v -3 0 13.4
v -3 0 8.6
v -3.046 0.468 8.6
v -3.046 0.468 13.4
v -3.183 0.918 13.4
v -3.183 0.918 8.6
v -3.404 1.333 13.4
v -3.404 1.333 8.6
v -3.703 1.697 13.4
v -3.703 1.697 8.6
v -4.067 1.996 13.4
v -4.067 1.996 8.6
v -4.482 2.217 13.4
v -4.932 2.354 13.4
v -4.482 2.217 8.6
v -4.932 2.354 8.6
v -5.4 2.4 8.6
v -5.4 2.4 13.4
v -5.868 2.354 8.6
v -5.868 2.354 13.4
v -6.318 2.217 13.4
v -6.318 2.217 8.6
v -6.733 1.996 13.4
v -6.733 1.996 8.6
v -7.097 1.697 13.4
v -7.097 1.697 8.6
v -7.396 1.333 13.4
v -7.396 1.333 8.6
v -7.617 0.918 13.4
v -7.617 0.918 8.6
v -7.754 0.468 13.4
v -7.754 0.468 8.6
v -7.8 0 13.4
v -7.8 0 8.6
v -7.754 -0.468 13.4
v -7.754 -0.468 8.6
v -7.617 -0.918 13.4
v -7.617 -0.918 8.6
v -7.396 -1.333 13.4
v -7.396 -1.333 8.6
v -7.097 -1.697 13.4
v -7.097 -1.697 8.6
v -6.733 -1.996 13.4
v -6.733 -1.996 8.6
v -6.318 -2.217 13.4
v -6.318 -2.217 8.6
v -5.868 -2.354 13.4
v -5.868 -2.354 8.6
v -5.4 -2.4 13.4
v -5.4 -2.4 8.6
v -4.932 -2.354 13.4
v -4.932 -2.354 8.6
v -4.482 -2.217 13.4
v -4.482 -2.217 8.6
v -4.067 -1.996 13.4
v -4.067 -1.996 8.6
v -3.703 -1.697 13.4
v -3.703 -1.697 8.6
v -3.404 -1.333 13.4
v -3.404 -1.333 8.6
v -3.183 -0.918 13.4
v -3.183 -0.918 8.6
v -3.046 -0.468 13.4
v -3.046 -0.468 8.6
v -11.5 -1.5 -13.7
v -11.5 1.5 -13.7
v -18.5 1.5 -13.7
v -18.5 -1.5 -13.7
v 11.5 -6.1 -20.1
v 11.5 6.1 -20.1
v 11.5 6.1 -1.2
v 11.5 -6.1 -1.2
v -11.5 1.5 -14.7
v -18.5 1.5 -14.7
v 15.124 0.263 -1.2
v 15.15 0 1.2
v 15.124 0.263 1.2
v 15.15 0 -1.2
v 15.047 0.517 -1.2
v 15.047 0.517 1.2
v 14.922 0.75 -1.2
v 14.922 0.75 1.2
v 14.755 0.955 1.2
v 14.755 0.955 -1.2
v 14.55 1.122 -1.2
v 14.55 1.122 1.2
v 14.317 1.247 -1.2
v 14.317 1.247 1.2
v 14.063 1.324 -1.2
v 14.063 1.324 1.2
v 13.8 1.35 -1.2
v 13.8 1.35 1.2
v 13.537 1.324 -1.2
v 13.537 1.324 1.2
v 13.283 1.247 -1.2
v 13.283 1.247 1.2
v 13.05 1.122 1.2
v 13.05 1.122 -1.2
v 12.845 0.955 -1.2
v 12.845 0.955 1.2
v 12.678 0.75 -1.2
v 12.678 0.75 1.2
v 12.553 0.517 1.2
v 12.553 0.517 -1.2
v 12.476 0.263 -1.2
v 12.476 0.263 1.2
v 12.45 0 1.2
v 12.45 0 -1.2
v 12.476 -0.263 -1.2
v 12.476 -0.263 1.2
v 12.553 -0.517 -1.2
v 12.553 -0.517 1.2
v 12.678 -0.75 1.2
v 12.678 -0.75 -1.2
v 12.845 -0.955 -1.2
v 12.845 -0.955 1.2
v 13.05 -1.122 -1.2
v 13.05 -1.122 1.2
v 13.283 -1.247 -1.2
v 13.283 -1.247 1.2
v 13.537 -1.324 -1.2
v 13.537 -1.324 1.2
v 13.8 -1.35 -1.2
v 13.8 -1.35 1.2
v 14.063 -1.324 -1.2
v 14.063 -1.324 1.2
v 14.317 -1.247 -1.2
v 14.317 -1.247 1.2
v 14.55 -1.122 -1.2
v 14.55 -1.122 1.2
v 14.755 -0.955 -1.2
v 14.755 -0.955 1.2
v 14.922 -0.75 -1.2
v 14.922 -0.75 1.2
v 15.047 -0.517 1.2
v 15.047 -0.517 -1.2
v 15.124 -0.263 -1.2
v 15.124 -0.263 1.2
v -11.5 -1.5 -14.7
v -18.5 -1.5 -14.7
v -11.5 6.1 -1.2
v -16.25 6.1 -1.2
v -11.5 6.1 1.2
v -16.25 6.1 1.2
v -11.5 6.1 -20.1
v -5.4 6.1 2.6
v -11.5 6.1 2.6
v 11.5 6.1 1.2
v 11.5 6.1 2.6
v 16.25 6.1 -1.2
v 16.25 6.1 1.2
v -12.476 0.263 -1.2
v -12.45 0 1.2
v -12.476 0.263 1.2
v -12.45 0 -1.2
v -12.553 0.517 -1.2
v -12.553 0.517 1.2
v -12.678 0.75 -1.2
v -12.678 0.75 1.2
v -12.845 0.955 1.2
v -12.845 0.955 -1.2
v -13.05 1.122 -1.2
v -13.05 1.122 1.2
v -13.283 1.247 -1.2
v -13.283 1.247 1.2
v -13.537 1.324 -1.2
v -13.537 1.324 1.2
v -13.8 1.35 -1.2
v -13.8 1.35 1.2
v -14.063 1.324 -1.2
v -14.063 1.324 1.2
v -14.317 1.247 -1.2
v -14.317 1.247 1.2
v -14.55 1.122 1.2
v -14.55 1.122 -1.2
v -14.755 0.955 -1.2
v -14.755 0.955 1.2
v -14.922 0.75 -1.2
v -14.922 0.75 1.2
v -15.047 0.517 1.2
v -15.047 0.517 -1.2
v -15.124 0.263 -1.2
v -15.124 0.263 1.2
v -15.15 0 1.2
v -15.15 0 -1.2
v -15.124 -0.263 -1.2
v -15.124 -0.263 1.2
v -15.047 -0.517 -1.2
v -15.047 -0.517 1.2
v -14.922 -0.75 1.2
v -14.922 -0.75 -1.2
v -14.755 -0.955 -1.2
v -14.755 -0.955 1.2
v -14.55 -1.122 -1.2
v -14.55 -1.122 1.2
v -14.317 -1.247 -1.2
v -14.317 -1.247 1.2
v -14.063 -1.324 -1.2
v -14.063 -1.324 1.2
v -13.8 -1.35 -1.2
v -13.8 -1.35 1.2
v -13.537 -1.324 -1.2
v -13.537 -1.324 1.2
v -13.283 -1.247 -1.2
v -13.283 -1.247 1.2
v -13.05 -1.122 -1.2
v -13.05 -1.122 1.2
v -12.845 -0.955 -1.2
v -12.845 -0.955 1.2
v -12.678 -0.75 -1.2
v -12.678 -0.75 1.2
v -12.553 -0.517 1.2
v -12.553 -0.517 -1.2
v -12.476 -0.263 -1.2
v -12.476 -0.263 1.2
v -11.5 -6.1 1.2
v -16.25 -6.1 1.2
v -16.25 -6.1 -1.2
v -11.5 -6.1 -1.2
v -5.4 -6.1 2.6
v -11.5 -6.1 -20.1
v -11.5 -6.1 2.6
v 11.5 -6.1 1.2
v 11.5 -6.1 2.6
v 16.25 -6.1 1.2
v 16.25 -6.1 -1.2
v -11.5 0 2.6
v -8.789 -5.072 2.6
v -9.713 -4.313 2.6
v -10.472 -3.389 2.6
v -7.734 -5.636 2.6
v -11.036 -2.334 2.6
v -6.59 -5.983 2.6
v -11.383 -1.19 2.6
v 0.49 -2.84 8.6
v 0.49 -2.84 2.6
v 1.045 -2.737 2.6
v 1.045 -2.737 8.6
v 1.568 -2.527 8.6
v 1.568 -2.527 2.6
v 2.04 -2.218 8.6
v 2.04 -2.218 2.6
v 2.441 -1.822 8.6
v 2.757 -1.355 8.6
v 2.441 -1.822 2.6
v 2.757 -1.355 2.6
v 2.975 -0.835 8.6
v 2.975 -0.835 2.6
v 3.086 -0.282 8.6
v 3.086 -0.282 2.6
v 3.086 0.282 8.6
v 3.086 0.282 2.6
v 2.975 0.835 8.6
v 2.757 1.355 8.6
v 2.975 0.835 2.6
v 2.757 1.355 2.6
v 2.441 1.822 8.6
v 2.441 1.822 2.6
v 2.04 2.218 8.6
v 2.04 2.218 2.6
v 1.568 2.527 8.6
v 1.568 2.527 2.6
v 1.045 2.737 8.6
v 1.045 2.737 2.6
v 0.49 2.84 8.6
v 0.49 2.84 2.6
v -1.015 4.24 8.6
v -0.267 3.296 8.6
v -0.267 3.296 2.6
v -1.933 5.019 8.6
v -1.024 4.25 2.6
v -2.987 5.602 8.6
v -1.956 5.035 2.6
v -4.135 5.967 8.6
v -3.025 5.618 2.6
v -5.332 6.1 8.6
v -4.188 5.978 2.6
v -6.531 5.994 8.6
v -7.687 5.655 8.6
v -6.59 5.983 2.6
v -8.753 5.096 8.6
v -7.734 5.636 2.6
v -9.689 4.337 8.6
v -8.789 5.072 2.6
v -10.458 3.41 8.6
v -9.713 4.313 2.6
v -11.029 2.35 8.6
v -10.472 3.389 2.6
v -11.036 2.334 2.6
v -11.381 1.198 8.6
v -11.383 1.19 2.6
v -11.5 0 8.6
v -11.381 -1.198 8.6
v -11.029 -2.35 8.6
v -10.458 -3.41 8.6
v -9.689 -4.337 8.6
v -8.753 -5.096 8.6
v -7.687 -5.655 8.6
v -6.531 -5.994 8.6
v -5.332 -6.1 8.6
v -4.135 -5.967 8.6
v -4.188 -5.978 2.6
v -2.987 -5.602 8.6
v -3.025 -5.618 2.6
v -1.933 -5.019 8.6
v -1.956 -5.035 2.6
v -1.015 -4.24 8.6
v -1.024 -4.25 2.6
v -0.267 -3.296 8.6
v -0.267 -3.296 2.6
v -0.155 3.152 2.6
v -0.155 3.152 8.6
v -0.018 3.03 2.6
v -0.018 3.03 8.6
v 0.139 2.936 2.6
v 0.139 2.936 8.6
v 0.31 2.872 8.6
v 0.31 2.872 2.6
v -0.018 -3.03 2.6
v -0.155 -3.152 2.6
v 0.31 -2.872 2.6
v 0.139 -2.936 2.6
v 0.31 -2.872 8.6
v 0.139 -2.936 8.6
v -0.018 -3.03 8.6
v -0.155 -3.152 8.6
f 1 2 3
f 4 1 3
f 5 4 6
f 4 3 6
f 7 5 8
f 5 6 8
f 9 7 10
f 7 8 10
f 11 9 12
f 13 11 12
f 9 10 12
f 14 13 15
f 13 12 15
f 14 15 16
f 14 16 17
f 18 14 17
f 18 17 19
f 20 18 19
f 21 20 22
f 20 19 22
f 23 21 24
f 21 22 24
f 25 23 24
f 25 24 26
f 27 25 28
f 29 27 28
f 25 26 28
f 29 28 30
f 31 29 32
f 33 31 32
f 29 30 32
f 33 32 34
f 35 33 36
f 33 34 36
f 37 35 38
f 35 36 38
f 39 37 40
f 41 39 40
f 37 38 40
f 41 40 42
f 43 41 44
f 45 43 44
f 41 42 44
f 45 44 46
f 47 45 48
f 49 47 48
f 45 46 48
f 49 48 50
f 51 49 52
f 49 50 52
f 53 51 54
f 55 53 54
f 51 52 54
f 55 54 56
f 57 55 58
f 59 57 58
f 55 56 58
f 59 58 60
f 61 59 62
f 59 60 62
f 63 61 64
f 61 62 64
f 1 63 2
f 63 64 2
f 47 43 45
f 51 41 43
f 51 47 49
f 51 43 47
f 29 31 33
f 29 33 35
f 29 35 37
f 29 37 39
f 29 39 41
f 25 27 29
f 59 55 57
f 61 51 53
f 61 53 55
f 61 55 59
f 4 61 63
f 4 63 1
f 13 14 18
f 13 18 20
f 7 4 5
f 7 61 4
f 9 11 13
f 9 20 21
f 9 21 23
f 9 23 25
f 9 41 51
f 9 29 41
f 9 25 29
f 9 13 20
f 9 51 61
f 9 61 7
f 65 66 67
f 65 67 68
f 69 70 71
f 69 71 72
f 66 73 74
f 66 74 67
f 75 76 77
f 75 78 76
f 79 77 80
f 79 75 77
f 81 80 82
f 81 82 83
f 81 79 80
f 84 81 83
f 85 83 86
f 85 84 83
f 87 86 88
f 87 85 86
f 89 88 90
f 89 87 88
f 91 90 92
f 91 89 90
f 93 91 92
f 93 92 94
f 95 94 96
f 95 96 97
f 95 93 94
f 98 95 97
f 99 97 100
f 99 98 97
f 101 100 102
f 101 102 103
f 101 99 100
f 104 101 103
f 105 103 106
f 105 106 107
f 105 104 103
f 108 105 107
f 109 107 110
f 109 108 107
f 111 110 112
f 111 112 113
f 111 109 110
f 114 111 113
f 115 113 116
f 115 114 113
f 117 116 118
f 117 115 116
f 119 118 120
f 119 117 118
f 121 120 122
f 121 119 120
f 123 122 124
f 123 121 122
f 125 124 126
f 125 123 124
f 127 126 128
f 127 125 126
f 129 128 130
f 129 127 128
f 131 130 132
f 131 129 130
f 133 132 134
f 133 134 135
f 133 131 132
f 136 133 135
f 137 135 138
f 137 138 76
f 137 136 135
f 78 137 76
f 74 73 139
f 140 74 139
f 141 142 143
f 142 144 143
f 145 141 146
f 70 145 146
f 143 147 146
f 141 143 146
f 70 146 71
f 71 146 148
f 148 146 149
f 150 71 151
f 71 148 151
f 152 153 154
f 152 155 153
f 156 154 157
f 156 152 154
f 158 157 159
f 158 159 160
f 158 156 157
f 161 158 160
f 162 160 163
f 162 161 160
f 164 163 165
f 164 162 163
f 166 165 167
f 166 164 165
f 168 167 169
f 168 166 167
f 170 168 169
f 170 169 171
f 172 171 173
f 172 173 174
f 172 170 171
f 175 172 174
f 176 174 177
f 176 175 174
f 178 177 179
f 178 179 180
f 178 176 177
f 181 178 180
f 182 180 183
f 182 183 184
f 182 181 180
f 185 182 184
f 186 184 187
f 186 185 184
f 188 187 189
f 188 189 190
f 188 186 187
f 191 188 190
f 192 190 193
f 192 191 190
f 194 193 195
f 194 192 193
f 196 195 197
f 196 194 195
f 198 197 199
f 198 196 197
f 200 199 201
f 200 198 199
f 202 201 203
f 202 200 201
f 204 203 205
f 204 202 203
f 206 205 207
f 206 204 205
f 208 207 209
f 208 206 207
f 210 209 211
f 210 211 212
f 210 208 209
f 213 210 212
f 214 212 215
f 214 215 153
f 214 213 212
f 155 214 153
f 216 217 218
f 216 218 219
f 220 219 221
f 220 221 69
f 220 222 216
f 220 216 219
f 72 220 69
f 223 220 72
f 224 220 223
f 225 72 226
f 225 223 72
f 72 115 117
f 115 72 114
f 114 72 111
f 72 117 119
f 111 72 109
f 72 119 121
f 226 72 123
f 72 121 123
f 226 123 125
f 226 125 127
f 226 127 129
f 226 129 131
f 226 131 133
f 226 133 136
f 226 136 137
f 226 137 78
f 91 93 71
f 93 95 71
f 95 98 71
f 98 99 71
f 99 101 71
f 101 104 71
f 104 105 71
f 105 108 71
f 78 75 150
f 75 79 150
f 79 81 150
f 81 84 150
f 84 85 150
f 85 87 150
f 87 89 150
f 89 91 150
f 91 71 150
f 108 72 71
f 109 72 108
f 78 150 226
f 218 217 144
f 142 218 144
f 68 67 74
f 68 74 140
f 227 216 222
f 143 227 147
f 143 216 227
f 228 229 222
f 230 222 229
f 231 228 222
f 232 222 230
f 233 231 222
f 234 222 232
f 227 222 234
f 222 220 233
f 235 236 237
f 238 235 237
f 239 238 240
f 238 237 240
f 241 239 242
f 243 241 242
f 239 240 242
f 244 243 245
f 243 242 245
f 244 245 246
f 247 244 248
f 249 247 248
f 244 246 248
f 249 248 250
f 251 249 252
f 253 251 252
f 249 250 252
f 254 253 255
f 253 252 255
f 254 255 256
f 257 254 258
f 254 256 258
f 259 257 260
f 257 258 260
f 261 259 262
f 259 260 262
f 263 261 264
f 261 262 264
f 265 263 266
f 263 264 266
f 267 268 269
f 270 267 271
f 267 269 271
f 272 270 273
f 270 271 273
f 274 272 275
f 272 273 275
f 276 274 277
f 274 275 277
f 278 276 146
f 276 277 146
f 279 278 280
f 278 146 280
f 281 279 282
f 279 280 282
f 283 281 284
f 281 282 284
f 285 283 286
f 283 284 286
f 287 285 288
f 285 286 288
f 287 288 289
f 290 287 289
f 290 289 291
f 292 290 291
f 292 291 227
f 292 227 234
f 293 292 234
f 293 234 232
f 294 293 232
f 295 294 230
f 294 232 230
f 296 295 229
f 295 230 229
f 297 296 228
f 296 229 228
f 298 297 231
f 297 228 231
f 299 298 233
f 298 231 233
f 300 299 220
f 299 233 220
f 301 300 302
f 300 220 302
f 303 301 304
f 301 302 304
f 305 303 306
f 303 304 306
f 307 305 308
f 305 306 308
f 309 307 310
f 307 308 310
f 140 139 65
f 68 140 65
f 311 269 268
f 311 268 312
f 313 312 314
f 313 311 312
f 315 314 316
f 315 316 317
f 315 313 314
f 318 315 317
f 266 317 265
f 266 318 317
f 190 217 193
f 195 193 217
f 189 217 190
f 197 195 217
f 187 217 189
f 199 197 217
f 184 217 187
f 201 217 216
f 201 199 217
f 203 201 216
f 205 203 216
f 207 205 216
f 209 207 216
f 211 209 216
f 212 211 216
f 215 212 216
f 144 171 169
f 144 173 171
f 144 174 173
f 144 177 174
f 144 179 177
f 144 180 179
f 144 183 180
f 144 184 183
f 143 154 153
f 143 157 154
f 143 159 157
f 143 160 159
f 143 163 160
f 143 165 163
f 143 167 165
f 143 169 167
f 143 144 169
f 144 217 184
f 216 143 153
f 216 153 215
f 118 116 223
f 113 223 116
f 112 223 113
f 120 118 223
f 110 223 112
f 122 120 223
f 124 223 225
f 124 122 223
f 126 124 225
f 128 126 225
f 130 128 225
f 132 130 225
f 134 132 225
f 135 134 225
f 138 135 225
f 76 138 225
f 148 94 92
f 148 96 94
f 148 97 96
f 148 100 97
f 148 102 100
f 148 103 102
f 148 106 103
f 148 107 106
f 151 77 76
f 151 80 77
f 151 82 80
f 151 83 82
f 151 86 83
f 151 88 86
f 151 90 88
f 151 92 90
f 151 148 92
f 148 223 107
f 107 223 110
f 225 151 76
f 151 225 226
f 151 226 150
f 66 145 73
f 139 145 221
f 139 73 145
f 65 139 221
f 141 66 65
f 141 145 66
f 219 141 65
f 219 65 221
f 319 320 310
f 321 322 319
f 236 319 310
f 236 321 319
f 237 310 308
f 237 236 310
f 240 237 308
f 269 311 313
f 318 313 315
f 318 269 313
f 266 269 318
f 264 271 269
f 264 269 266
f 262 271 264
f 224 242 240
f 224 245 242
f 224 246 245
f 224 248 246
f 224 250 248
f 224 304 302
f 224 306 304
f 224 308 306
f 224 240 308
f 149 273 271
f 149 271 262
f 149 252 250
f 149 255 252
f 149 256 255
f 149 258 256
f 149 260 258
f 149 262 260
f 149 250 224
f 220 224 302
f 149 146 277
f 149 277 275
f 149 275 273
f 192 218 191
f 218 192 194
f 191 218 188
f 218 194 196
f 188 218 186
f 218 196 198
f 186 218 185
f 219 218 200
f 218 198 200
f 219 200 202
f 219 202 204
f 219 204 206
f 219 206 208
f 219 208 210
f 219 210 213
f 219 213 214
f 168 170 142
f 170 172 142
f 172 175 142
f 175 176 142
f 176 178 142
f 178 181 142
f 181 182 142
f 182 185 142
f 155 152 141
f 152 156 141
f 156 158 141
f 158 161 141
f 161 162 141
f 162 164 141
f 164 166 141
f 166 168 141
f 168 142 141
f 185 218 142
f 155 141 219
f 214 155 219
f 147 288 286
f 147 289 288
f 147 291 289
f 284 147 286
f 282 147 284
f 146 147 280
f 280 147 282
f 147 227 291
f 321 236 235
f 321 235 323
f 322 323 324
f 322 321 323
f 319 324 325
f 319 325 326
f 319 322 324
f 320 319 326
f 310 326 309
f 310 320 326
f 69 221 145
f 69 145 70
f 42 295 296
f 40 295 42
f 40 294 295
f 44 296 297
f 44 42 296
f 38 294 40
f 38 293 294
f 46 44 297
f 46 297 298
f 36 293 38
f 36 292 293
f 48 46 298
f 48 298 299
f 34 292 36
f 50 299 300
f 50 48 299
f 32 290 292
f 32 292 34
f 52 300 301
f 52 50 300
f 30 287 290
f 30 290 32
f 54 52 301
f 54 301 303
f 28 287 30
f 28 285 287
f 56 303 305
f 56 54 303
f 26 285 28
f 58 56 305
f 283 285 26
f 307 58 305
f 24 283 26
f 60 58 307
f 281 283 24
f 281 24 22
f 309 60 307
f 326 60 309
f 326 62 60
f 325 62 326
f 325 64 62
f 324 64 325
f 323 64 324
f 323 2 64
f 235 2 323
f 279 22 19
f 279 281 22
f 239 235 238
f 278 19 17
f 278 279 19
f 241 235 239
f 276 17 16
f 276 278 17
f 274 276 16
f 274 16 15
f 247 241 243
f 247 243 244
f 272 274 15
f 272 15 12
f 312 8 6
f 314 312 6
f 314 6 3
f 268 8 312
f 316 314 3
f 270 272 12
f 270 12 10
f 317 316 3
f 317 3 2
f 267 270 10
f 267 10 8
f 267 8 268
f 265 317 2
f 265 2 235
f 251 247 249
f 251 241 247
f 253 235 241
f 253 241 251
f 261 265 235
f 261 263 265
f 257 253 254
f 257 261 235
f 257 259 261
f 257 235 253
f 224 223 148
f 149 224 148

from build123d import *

# Parameters (mm, degrees)
SKETCH013_W  = 32.5
SKETCH013_H  = 12.2
SKETCH013_R  = 1.35
PAD003_DEPTH = 1.2
SKETCH014_W  = 23
SKETCH014_H  = 12.2
PAD001_DEPTH = 1.4
PAD002_DEPTH = 6
SKETCH003_R  = 2.4
PAD005_DEPTH = 4.8
SKETCH016_W  = 23
SKETCH016_H  = 12.2
PAD004_DEPTH = 18.9
SKETCH012_W  = 3
SKETCH012_H  = 1
PAD008_DEPTH = 7


with BuildPart() as part:
    # Sketch013 → Pad003 (new body, symmetric)
    with BuildSketch(Plane.XY):
        Rectangle(SKETCH013_W, SKETCH013_H)
        with Locations((-13.8, 0)):
            Circle(SKETCH013_R, mode=Mode.SUBTRACT)
        with Locations((13.8, 0)):
            Circle(SKETCH013_R, mode=Mode.SUBTRACT)
    extrude(amount=PAD003_DEPTH, both=True)

    # Sketch014 → Pad001 (join)
    with BuildSketch(Plane.XY.offset(1.2)):
        Rectangle(SKETCH014_W, SKETCH014_H)
    extrude(amount=PAD001_DEPTH)

    # Sketch015 → Pad002 (join)
    with BuildSketch(Plane.XY.offset(2.6)):
        with BuildLine():
            ThreePointArc((-0.26712, 3.295988), (-11.5, 0), (-0.26712, -3.295988))
            ThreePointArc((0.490093, -2.839869), (0.058351, -2.979717), (-0.26712, -3.295988))
            ThreePointArc((0.490093, -2.839869), (3.1, 0), (0.490093, 2.839869))
            ThreePointArc((-0.26712, 3.295988), (0.058351, 2.979717), (0.490093, 2.839869))
        make_face()
    extrude(amount=PAD002_DEPTH)

    # Sketch003 → Pad005 (join)
    with BuildSketch(Plane.XY.offset(8.6)):
        with Locations((-5.4, 0)):
            Circle(SKETCH003_R)
    extrude(amount=PAD005_DEPTH)

    # Sketch016 → Pad004 (join)
    with BuildSketch(Plane(origin=(0, 0, -1.2), x_dir=(1, 0, 0), z_dir=(0, 0, -1))):
        Rectangle(SKETCH016_W, SKETCH016_H)
    extrude(amount=PAD004_DEPTH)

    # Sketch012 (on Face11 of Pad004) → Pad008 (join)
    with BuildSketch(Plane(origin=(-11.5, 0, 0), x_dir=(0, -1, 0), z_dir=(-1, 0, 0))):
        with Locations((0, -14.2)):
            Rectangle(SKETCH012_W, SKETCH012_H)
    extrude(amount=PAD008_DEPTH)


solid = part.part
